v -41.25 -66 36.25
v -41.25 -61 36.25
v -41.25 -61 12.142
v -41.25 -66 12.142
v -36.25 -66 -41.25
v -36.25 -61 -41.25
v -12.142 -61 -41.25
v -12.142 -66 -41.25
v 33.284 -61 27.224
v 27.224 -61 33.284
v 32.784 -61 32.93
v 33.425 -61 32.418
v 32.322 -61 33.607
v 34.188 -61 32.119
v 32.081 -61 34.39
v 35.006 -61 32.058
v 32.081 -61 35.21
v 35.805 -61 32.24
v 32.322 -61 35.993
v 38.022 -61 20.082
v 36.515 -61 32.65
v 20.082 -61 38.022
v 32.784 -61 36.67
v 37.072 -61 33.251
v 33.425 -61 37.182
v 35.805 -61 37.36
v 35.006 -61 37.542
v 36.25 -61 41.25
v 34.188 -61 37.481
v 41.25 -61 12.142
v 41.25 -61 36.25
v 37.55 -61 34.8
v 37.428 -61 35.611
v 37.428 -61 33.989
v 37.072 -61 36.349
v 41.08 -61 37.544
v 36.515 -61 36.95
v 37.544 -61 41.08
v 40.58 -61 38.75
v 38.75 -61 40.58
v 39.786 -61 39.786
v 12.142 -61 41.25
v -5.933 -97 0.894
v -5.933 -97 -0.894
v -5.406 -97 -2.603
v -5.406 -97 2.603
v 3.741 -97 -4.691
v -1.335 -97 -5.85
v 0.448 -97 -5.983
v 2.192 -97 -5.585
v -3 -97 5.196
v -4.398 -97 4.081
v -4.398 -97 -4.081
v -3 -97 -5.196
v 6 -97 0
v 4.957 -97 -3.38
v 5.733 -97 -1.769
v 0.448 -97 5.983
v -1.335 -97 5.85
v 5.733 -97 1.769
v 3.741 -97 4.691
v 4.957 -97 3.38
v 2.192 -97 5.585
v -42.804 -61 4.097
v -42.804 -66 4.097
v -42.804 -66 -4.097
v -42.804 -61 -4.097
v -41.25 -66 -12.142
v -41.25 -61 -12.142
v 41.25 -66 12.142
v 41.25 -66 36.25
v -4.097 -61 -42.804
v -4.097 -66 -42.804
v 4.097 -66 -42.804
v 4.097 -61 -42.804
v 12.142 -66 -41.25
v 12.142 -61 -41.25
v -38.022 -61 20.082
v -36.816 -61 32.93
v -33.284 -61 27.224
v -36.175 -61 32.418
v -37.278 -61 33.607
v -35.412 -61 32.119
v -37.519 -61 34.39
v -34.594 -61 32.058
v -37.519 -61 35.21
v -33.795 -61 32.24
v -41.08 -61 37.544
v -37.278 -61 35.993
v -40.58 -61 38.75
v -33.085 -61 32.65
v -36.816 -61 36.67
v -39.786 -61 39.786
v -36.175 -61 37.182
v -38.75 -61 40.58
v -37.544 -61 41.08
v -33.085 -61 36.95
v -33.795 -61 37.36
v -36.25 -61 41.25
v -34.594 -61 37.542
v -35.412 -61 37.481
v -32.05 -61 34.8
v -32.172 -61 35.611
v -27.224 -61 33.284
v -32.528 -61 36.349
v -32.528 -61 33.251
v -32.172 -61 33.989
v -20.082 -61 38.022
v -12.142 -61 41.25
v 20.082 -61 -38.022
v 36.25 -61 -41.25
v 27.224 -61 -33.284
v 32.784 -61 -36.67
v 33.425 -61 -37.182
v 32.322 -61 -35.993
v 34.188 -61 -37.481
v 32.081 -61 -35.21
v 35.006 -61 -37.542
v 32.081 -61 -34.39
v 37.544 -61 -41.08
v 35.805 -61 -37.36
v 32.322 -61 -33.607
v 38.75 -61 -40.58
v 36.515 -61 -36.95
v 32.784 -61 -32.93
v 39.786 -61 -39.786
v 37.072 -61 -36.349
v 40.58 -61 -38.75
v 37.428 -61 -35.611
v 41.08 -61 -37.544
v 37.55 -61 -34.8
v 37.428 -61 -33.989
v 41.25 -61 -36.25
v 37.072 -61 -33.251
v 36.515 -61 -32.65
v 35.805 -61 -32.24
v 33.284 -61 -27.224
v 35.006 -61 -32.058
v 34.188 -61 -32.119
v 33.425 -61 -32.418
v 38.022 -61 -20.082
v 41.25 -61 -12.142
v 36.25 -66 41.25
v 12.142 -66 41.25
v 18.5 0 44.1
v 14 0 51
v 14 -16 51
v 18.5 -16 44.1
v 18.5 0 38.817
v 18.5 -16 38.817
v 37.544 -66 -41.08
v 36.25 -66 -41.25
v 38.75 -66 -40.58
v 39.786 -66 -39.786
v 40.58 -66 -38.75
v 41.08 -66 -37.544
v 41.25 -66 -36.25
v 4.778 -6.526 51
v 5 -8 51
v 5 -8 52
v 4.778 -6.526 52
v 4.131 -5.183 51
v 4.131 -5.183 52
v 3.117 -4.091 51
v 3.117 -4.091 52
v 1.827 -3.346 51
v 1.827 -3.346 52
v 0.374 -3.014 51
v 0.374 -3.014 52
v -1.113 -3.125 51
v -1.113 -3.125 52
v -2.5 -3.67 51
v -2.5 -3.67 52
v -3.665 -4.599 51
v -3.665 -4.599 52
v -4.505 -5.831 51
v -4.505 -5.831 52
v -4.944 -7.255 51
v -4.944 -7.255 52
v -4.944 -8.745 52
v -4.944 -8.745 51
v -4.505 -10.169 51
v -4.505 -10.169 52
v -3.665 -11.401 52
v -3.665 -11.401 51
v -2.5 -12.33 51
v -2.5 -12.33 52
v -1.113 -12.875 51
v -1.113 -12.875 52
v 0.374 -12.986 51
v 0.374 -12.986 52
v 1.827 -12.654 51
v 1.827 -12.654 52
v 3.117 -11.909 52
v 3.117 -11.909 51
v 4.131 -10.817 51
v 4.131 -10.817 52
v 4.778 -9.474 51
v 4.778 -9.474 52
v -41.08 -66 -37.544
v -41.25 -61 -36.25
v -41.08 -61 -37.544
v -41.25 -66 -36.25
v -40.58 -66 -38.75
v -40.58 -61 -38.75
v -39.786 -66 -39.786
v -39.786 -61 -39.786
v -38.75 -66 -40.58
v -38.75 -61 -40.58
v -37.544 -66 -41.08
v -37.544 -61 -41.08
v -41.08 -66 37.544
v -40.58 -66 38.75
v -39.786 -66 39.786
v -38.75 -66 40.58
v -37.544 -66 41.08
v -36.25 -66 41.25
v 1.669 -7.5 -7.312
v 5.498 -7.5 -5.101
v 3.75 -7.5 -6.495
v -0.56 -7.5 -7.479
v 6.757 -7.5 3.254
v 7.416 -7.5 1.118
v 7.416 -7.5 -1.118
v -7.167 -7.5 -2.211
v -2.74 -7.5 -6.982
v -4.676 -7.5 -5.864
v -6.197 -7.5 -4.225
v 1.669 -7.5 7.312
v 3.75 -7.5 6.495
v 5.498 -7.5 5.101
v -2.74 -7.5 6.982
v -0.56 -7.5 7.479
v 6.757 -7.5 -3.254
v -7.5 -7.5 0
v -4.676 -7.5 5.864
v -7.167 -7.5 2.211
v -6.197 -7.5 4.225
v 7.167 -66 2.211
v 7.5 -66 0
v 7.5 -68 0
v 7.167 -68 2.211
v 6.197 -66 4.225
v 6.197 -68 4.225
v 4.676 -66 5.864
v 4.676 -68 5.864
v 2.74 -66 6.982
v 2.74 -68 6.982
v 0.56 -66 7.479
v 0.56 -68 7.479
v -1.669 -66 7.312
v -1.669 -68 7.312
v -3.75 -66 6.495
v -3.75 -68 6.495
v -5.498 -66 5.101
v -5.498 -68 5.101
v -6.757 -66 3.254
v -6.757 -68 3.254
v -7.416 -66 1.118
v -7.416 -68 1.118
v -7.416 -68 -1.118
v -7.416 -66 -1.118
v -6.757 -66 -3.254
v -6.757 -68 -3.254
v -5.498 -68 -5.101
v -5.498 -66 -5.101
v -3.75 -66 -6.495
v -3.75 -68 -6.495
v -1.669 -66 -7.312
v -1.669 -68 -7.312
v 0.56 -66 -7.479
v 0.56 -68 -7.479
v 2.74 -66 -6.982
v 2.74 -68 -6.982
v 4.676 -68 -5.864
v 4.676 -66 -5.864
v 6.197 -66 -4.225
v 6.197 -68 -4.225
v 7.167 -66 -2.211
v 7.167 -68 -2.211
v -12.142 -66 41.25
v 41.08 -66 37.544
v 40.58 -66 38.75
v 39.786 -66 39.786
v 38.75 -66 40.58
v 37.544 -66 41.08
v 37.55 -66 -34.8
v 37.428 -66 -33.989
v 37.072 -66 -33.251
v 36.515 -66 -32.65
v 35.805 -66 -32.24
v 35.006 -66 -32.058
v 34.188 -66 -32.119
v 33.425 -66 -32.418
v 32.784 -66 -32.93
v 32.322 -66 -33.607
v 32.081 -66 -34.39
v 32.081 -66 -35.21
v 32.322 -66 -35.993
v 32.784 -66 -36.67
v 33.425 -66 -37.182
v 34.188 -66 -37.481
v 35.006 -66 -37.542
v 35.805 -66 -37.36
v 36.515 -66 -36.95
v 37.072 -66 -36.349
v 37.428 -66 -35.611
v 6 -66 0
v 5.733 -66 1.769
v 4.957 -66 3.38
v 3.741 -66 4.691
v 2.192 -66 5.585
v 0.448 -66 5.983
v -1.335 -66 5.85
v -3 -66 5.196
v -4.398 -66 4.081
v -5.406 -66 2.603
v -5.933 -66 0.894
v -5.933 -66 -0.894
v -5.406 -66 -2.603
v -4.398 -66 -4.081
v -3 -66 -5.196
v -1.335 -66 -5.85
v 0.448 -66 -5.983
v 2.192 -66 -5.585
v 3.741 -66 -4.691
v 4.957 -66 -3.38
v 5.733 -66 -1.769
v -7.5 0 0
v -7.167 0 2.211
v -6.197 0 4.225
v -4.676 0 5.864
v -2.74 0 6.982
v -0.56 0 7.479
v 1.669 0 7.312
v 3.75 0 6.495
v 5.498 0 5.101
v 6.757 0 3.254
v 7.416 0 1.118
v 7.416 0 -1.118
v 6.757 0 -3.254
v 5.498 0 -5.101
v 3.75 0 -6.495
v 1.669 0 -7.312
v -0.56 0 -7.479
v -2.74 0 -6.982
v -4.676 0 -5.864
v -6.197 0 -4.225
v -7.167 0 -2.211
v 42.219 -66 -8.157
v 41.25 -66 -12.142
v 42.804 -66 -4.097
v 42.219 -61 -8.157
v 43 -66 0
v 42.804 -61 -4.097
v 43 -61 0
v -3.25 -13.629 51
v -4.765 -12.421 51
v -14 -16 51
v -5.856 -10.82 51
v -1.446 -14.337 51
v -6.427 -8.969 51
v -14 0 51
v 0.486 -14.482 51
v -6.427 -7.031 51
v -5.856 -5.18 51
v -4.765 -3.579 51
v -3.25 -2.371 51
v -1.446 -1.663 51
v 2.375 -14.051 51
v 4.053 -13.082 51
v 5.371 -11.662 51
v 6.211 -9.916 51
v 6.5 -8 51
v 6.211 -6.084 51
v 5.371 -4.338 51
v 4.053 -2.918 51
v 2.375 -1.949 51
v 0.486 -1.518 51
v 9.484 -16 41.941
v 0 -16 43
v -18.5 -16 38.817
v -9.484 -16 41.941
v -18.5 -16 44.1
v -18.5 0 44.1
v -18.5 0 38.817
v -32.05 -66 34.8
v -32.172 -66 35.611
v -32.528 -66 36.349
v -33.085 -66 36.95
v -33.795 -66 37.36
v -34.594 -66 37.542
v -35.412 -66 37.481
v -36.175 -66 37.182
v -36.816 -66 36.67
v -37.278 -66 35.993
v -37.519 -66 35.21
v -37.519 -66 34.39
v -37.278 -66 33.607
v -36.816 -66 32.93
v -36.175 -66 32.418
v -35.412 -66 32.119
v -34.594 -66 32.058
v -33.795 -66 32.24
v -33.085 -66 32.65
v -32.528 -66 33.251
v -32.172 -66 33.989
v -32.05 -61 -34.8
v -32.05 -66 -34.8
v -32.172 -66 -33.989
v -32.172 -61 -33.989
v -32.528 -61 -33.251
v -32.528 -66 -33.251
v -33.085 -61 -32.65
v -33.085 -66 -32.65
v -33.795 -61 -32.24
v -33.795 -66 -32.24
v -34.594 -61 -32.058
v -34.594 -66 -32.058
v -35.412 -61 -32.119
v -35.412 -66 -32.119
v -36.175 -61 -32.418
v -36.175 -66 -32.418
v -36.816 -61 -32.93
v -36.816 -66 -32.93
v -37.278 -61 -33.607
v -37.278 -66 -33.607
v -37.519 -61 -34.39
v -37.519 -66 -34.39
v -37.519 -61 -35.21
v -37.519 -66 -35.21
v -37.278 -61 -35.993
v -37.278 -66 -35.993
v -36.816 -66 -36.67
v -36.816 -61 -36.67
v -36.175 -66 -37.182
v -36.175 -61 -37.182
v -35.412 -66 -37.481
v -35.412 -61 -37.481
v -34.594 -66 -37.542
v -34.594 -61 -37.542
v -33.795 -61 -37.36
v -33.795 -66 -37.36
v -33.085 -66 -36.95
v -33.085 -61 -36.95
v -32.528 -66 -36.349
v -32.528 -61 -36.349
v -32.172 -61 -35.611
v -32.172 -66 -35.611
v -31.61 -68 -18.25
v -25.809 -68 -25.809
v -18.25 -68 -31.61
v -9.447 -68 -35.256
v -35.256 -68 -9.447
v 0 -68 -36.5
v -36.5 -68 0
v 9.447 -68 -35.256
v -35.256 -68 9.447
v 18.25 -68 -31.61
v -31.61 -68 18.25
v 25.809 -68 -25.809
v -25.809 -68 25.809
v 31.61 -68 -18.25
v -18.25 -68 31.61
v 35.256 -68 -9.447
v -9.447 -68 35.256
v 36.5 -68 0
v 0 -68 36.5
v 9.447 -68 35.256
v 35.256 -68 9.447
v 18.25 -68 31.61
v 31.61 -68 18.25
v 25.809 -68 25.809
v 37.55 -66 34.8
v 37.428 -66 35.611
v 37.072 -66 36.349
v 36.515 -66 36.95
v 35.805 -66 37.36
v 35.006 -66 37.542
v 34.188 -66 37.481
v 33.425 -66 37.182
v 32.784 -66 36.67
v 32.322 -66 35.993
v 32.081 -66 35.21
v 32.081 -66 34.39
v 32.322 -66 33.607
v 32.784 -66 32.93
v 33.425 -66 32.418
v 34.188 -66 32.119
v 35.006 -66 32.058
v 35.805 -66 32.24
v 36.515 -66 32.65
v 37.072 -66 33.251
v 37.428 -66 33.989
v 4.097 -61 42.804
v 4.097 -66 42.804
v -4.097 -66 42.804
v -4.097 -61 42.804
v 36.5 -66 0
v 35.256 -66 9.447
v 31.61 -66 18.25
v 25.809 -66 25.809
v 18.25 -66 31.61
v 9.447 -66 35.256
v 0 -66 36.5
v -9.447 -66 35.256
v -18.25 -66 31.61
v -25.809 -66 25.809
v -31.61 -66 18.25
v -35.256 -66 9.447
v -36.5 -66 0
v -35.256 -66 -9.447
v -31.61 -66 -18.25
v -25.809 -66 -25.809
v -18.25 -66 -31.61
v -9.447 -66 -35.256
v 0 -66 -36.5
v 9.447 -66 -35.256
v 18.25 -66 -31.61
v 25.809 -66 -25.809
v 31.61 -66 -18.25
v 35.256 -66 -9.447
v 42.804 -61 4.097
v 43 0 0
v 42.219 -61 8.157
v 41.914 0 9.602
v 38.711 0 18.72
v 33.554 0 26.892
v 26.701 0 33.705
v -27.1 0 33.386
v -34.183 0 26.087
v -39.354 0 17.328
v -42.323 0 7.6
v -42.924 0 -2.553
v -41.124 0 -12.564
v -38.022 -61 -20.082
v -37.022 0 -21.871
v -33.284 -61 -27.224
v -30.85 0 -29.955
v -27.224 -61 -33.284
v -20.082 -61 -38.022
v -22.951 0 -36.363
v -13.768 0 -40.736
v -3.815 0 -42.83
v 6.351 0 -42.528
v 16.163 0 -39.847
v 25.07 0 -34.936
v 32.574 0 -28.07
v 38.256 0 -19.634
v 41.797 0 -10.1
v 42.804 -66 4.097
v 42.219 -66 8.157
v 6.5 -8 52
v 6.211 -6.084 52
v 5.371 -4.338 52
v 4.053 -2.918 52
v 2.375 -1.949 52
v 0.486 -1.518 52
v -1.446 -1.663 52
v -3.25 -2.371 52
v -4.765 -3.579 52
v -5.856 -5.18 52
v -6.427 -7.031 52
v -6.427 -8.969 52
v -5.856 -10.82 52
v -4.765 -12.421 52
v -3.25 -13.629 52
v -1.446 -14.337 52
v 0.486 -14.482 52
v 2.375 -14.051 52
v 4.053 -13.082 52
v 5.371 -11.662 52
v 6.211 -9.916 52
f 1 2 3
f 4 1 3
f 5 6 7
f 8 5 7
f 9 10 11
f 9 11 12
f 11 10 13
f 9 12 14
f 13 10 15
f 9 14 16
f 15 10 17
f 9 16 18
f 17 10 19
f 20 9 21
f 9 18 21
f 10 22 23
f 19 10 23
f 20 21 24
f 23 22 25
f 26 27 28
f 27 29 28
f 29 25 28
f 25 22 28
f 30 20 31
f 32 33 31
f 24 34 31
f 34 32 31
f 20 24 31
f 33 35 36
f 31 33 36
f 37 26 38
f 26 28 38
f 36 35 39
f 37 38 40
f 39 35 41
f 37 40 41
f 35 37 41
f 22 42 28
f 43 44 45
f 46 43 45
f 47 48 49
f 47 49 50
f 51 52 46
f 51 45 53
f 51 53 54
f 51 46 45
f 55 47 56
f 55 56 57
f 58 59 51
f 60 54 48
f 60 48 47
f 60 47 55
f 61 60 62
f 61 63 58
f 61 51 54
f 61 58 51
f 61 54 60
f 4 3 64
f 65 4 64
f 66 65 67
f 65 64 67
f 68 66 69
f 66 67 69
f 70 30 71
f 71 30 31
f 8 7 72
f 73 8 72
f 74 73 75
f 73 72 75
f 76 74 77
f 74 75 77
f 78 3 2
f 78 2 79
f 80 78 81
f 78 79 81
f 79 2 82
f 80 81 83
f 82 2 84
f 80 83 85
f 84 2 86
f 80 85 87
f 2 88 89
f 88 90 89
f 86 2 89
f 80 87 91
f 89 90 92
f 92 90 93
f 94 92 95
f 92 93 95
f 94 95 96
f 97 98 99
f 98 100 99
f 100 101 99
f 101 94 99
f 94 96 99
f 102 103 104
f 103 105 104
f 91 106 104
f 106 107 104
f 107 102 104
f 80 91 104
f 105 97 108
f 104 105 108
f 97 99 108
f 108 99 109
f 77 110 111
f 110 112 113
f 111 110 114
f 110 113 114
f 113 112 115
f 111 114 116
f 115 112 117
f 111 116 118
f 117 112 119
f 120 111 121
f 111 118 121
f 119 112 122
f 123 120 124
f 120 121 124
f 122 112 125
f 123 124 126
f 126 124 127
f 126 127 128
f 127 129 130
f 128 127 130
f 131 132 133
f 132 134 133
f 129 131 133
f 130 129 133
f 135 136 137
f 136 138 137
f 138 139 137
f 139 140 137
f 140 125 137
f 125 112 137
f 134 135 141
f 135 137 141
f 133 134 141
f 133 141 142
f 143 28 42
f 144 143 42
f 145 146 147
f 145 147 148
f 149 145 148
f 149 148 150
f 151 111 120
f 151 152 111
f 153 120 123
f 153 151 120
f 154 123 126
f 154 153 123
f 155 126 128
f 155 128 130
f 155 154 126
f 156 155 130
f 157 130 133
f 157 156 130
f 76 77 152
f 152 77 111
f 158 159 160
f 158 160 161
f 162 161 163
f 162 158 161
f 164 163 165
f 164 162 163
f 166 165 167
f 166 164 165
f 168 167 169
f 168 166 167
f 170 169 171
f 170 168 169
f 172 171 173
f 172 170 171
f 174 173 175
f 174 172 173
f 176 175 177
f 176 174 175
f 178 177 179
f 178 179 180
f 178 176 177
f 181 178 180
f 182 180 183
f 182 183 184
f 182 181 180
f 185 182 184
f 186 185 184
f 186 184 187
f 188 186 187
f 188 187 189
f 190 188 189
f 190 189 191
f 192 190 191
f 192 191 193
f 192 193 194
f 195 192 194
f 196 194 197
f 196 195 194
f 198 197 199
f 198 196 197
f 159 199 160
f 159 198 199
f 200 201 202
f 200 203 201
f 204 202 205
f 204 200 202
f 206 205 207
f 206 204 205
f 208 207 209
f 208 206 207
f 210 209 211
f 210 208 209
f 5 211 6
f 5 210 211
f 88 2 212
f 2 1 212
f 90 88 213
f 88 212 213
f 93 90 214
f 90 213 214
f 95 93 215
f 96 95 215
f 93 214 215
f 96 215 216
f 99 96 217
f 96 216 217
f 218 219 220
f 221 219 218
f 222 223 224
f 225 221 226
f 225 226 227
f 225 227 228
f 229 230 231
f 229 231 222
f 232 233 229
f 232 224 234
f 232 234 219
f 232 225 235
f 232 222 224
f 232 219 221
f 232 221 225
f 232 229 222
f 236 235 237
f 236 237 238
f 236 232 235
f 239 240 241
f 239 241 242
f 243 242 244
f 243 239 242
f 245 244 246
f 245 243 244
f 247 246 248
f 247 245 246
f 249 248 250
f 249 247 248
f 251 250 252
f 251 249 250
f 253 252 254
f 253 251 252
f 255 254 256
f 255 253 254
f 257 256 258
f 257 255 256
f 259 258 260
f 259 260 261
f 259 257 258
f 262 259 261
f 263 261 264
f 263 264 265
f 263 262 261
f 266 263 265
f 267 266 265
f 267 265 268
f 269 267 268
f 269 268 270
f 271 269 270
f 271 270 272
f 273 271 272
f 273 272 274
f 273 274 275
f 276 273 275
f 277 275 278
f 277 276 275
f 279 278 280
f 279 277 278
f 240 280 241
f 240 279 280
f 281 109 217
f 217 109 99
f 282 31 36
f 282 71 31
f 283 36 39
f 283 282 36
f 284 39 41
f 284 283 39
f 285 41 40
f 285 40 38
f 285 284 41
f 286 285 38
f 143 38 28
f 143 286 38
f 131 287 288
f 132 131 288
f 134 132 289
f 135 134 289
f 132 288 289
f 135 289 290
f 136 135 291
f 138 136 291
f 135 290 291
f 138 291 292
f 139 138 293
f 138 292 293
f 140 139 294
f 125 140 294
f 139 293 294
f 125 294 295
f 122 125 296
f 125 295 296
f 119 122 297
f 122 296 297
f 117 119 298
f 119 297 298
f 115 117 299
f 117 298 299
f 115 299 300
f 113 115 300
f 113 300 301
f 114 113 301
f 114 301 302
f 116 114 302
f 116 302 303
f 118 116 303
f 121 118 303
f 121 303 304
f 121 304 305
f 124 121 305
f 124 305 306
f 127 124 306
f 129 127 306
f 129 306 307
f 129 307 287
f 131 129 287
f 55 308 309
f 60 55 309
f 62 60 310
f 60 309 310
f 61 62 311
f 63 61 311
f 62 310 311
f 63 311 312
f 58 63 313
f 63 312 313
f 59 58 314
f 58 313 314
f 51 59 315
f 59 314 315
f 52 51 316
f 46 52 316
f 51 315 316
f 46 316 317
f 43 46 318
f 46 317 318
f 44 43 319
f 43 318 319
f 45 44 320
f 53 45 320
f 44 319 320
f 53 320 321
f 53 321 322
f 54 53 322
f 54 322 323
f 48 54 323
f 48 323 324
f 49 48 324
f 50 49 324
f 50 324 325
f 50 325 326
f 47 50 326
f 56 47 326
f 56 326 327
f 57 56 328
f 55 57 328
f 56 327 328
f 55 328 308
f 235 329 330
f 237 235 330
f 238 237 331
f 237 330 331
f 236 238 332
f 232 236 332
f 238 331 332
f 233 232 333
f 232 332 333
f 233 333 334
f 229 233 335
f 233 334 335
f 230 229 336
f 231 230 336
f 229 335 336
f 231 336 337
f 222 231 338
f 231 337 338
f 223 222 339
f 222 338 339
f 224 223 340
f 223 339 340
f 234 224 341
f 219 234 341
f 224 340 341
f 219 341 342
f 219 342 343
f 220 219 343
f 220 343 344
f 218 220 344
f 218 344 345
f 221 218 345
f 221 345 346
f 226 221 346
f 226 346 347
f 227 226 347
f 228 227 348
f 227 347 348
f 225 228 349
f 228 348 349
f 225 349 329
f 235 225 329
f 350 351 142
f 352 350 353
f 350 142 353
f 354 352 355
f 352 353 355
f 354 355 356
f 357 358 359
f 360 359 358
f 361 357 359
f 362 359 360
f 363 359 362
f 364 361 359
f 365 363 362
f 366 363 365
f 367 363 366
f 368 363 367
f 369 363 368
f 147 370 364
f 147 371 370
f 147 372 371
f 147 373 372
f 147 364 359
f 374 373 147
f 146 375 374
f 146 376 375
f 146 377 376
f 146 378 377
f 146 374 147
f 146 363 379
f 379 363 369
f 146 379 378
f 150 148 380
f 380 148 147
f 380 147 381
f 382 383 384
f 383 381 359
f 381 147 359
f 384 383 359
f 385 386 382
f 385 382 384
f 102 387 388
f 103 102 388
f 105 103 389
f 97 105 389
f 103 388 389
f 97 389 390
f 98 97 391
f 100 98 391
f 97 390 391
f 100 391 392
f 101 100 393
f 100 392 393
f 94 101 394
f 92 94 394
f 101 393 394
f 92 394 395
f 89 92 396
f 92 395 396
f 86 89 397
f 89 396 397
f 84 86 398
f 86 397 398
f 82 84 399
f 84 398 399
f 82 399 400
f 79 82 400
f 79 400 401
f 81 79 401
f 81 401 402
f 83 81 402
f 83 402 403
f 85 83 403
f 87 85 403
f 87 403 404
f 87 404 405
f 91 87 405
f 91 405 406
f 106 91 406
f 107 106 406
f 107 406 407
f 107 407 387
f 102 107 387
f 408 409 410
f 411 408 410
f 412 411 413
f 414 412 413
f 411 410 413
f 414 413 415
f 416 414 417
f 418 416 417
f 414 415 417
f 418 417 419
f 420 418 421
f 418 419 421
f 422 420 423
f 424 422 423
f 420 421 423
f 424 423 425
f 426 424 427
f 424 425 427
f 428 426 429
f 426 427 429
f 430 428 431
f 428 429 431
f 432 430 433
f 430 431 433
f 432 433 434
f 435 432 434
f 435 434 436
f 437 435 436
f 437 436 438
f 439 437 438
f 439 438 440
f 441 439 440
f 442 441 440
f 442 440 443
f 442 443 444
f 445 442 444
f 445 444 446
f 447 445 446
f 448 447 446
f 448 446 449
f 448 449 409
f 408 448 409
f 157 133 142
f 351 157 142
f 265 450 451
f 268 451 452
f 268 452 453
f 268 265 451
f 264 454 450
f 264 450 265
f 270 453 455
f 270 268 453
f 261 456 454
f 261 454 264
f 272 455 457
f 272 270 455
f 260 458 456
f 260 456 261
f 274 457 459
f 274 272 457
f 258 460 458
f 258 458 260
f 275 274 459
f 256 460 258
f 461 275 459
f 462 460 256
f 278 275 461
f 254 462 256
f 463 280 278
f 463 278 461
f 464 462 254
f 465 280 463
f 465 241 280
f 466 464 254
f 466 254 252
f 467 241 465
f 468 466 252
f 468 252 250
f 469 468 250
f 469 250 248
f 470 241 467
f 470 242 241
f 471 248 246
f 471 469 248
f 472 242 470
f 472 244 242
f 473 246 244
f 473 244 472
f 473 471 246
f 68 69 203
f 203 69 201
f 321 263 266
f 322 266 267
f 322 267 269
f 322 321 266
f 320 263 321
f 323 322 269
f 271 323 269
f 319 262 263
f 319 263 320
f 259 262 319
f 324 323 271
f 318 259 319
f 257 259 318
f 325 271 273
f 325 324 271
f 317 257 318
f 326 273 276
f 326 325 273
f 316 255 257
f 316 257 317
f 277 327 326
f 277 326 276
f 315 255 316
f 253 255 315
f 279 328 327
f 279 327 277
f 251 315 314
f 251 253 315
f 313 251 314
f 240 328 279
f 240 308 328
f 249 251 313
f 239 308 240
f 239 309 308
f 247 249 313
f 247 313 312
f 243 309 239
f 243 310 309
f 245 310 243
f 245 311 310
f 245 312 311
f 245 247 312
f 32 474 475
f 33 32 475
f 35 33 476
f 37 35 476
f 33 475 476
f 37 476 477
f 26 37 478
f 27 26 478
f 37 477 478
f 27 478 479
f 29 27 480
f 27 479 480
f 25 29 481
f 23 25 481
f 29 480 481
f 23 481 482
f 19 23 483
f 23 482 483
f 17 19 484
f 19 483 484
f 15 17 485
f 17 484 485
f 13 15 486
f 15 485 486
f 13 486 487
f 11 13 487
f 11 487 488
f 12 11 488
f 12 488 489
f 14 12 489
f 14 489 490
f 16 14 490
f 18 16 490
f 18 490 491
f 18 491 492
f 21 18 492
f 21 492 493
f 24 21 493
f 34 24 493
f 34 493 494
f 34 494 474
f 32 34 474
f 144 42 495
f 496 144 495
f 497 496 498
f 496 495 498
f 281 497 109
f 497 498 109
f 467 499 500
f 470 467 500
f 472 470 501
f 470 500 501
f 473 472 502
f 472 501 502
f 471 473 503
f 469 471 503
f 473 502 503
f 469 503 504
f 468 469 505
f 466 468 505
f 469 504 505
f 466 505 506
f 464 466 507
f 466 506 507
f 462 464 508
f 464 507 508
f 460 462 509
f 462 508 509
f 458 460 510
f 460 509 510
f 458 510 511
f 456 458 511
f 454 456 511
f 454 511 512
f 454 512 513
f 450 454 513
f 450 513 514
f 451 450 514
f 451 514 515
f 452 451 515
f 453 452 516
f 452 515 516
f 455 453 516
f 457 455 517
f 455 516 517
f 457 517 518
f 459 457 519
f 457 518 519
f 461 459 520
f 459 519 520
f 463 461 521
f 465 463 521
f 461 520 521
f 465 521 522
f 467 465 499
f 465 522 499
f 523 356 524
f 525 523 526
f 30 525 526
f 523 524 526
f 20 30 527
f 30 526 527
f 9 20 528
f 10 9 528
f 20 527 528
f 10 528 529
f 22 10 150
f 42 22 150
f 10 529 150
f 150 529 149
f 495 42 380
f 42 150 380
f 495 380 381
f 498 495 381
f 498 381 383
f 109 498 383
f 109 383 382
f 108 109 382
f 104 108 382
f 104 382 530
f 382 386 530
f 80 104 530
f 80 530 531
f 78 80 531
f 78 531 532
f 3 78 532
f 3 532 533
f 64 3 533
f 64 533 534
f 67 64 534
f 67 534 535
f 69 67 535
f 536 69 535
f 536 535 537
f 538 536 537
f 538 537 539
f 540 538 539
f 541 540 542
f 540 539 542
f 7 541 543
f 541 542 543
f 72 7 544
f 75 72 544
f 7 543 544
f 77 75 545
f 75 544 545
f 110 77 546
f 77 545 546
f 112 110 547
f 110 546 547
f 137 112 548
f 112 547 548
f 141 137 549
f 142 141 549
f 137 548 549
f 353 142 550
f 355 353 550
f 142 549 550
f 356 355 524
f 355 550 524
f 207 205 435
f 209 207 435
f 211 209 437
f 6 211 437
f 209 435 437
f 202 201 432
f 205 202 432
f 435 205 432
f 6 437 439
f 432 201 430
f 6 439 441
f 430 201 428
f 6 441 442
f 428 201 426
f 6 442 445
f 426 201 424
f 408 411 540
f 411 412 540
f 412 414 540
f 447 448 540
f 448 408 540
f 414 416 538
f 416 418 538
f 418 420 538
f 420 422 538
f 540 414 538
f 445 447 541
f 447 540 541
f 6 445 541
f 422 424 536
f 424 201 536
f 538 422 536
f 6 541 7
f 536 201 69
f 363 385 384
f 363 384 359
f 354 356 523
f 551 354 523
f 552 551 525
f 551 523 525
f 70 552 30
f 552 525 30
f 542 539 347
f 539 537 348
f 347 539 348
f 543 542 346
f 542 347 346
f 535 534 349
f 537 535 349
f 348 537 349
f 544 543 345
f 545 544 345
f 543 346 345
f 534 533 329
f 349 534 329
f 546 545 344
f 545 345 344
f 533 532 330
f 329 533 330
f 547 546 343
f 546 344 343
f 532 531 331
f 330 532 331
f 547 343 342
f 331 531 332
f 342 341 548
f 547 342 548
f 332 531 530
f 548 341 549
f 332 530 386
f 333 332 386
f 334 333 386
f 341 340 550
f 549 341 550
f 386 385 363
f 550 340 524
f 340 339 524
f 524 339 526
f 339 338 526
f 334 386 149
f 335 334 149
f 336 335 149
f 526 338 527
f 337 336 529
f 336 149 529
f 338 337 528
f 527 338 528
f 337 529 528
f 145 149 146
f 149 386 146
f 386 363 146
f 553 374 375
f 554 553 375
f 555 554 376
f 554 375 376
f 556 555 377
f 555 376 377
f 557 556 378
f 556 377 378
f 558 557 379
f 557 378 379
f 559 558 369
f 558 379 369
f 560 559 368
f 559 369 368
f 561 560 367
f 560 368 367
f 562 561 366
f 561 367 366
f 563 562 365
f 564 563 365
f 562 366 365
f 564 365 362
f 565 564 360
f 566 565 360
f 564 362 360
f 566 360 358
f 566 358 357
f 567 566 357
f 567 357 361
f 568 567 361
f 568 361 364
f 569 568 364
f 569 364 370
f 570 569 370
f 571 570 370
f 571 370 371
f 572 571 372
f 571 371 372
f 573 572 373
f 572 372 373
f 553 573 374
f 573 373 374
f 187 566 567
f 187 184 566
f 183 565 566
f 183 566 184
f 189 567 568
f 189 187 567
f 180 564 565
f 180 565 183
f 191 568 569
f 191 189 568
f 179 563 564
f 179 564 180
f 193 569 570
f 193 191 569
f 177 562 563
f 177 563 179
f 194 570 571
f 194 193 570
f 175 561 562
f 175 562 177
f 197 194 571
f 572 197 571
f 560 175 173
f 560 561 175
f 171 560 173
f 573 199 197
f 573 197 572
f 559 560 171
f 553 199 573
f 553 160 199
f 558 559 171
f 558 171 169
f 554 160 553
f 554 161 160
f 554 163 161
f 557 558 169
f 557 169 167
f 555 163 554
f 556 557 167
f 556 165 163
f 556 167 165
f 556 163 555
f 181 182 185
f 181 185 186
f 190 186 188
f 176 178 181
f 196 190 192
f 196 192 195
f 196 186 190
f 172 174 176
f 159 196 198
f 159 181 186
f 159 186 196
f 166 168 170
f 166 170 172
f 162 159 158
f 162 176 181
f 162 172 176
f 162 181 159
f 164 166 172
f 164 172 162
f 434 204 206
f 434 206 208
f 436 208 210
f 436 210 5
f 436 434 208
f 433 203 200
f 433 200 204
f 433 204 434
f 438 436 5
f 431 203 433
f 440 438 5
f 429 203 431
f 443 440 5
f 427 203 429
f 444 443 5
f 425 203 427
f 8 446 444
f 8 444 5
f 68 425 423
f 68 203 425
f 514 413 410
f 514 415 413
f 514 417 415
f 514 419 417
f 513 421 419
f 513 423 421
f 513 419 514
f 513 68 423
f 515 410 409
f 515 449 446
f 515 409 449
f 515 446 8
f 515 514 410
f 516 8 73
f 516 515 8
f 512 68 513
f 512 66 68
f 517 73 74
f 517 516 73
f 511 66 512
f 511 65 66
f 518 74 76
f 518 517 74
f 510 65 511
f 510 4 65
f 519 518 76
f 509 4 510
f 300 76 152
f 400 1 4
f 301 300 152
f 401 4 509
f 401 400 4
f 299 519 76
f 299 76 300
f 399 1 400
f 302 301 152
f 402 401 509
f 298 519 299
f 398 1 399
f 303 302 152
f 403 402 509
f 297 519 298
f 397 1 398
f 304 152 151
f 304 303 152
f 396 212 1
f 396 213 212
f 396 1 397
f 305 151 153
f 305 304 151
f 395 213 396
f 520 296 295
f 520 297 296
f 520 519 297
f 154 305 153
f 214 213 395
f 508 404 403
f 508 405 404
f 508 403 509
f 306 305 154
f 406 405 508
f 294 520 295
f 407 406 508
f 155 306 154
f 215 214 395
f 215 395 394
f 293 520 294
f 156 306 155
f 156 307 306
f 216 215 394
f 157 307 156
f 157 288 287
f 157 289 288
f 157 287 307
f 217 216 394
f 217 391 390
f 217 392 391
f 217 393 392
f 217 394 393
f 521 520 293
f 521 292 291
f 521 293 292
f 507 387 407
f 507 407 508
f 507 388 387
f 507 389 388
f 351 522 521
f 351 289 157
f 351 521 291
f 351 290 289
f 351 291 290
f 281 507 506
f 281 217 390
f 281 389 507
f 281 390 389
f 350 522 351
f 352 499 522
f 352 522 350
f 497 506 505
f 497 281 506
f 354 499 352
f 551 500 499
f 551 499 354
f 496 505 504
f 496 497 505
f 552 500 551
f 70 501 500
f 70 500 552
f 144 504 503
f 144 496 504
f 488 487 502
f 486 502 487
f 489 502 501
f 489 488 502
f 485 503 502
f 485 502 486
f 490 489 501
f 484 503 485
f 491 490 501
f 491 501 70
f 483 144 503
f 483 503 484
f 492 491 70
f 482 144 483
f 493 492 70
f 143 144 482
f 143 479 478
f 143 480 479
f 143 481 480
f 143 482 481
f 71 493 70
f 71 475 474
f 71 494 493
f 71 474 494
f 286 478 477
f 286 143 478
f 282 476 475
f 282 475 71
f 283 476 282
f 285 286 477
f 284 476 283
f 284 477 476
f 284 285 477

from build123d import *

# Parameters (mm, degrees)
F0_R      = 43
F1_DEPTH  = 61
F2_R      = 7.5
F3_DEPTH  = 7.5
F5_DEPTH  = 5
F6_R      = 5
F7_R      = 2.75
F8_DEPTH  = 66.001
F9_R      = 36.5
F9_R_2    = 7.5
F10_DEPTH = 2
F11_R     = 6
F12_DEPTH = 31
F14_DEPTH = 16
F15_R     = 6.5
F15_R_2   = 5
F16_DEPTH = 1


with BuildPart() as f1:
    # F0 (on Front) → F1 (new body)
    with BuildSketch(Plane.XZ):
        Circle(F0_R)
    extrude(amount=F1_DEPTH)

    # F2 (on face) → F3 (cut)
    with BuildSketch(Plane(origin=(0, 0, 0), x_dir=(-1, 0, 0), z_dir=(0, 1, 0))):
        Circle(F2_R)
    extrude(amount=-F3_DEPTH, mode=Mode.SUBTRACT)

    # F4 (on face) → F5 (join)
    with BuildSketch(Plane.XZ.offset(61)):
        with BuildLine():
            Line((-41.25, -12.142384), (-41.25, -41.25))
            Line((-41.25, -41.25), (-12.142384, -41.25))
            ThreePointArc((-12.142384, -41.25), (-30.405592, -30.405592), (-41.25, -12.142384))
        make_face()
        with BuildLine():
            ThreePointArc((-41.25, -12.142384), (-30.405592, -30.405592), (-12.142384, -41.25))
            ThreePointArc((-12.142384, -41.25), (0, -43), (12.142384, -41.25))
            ThreePointArc((12.142384, -41.25), (30.405592, -30.405592), (41.25, -12.142384))
            ThreePointArc((41.25, -12.142384), (42.560251, -6.133922), (43, 0))
            ThreePointArc((43, 0), (42.560251, 6.133922), (41.25, 12.142384))
            ThreePointArc((41.25, 12.142384), (30.405592, 30.405592), (12.142384, 41.25))
            ThreePointArc((12.142384, 41.25), (0, 43), (-12.142384, 41.25))
            ThreePointArc((-12.142384, 41.25), (-30.405592, 30.405592), (-41.25, 12.142384))
            ThreePointArc((-41.25, 12.142384), (-43, 0), (-41.25, -12.142384))
        make_face()
        with BuildLine():
            ThreePointArc((41.25, -12.142384), (30.405592, -30.405592), (12.142384, -41.25))
            Line((12.142384, -41.25), (41.25, -41.25))
            Line((41.25, -41.25), (41.25, -12.142384))
        make_face()
        with BuildLine():
            Line((-41.25, 41.25), (-41.25, 12.142384))
            ThreePointArc((-41.25, 12.142384), (-30.405592, 30.405592), (-12.142384, 41.25))
            Line((-12.142384, 41.25), (-41.25, 41.25))
        make_face()
        with BuildLine():
            Line((41.25, 41.25), (12.142384, 41.25))
            ThreePointArc((12.142384, 41.25), (30.405592, 30.405592), (41.25, 12.142384))
            Line((41.25, 12.142384), (41.25, 41.25))
        make_face()
    extrude(amount=F5_DEPTH)

    # F6
    f6_edges = [f1.edges().sort_by_distance(p)[0] for p in [
        (41.25, -63.5, -41.25),
        (-41.25, -63.5, -41.25),
        (-41.25, -63.5, 41.25),
        (41.25, -63.5, 41.25),
    ]]
    fillet(f6_edges, radius=F6_R)

    # F7 (on face) → F8 (cut, through all)
    with BuildSketch(Plane.XZ.offset(66)):
        with Locations((-34.8, 34.8)):
            Circle(F7_R)
        with Locations((34.8, 34.8)):
            Circle(F7_R)
        with Locations((34.8, -34.8)):
            Circle(F7_R)
        with Locations((-34.8, -34.8)):
            Circle(F7_R)
    extrude(amount=-F8_DEPTH, mode=Mode.SUBTRACT)

    # F9 (on face) → F10 (join)
    with BuildSketch(Plane.XZ.offset(66)):
        Circle(F9_R)
        Circle(F9_R_2, mode=Mode.SUBTRACT)
    extrude(amount=F10_DEPTH)

    # F11 (on face) → F12 (join)
    with BuildSketch(Plane.XZ.offset(66)):
        Circle(F11_R)
    extrude(amount=F12_DEPTH)

    # F13 (on face) → F14 (join)
    with BuildSketch(Plane(origin=(0, 0, 0), x_dir=(-1, 0, 0), z_dir=(0, 1, 0))):
        with BuildLine():
            Line((-18.5, 44.100001), (-18.5, 38.816878))
            ThreePointArc((-18.5, 38.816878), (0, 43), (18.5, 38.816878))
            Line((18.5, 38.816878), (18.5, 44.100001))
            Line((18.5, 44.100001), (14, 51))
            Line((14, 51), (0, 51))
            Line((0, 51), (-14, 51))
            Line((-14, 51), (-18.5, 44.100001))
        make_face()
    extrude(amount=-F14_DEPTH)

    # F15 (on face) → F16 (join)
    with BuildSketch(Plane.XY.offset(51)):
        with Locations((0, -8)):
            Circle(F15_R)
        with Locations((0, -8)):
            Circle(F15_R_2, mode=Mode.SUBTRACT)
    extrude(amount=F16_DEPTH)


solid = f1.part
